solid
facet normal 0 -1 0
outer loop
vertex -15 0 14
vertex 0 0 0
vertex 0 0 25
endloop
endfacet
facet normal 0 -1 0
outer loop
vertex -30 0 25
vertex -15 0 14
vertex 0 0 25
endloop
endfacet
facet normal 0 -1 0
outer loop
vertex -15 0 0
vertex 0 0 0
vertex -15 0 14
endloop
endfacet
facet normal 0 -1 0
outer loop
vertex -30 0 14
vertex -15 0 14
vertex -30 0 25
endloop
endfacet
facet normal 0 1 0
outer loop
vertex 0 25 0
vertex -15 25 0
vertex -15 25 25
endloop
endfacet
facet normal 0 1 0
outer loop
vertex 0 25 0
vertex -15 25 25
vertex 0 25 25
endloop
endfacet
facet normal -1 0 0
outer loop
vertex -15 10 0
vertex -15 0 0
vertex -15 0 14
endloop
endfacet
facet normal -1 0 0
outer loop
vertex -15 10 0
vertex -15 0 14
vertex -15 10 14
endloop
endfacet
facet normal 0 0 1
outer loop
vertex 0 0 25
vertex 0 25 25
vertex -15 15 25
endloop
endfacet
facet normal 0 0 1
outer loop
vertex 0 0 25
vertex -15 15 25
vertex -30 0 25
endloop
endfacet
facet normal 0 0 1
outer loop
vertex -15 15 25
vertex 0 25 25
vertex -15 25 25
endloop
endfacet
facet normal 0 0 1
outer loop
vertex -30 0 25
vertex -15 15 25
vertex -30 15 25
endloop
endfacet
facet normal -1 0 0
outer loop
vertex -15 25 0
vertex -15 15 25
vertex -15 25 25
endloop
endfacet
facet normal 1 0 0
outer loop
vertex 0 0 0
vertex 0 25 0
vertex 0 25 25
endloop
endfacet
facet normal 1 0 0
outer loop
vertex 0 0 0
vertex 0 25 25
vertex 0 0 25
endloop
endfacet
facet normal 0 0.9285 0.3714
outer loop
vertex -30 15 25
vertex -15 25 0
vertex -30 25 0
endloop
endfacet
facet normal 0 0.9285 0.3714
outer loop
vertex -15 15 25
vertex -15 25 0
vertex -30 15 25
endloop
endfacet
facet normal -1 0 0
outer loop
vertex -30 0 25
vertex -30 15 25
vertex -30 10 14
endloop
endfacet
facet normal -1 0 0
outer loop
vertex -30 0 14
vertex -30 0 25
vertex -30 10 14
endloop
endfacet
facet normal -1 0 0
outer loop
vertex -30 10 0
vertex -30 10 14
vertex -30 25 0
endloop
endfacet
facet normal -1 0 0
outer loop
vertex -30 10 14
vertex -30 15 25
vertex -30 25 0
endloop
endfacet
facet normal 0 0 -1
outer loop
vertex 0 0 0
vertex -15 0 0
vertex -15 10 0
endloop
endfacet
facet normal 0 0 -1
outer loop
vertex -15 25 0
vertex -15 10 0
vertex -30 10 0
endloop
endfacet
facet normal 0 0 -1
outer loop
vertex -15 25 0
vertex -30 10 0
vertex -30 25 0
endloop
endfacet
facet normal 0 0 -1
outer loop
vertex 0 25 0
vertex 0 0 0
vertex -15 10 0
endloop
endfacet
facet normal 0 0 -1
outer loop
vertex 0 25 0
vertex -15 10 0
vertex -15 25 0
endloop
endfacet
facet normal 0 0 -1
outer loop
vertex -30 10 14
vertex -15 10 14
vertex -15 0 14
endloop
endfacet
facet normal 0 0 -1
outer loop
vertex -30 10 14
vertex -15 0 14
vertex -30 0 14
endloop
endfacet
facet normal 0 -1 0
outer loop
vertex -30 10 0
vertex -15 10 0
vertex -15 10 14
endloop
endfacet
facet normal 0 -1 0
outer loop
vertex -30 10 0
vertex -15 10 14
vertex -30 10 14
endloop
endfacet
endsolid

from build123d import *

# Parameters (mm, degrees)
BOSS_EXTRUDE1_DEPTH = 25
BOSS_EXTRUDE2_DEPTH = 15
SKETCH3_W           = 15
SKETCH3_H           = 10
CUT_EXTRUDE1_DEPTH  = 14


with BuildPart() as part:
    # Sketch1 → Boss-Extrude1 (new body)
    with BuildSketch(Plane.XY):
        Polygon((-30, 15), (-15, 15), (-15, 25), (0, 25), (0, 0), (-30, 0), align=None)
    extrude(amount=BOSS_EXTRUDE1_DEPTH)

    # Sketch2 → Boss-Extrude2 (add)
    with BuildSketch(Plane.ZY.offset(15)):
        Polygon((0, 25), (25, 15), (0, 15), align=None)
    extrude(amount=BOSS_EXTRUDE2_DEPTH)

    # Sketch3 → Cut-Extrude1 (cut)
    with BuildSketch(Plane(origin=(0, 0, 0), x_dir=(-1, 0, 0), z_dir=(0, 0, -1))):
        with Locations((22.5, 5)):
            Rectangle(SKETCH3_W, SKETCH3_H)
    extrude(amount=-CUT_EXTRUDE1_DEPTH, mode=Mode.SUBTRACT)


solid = part.part
